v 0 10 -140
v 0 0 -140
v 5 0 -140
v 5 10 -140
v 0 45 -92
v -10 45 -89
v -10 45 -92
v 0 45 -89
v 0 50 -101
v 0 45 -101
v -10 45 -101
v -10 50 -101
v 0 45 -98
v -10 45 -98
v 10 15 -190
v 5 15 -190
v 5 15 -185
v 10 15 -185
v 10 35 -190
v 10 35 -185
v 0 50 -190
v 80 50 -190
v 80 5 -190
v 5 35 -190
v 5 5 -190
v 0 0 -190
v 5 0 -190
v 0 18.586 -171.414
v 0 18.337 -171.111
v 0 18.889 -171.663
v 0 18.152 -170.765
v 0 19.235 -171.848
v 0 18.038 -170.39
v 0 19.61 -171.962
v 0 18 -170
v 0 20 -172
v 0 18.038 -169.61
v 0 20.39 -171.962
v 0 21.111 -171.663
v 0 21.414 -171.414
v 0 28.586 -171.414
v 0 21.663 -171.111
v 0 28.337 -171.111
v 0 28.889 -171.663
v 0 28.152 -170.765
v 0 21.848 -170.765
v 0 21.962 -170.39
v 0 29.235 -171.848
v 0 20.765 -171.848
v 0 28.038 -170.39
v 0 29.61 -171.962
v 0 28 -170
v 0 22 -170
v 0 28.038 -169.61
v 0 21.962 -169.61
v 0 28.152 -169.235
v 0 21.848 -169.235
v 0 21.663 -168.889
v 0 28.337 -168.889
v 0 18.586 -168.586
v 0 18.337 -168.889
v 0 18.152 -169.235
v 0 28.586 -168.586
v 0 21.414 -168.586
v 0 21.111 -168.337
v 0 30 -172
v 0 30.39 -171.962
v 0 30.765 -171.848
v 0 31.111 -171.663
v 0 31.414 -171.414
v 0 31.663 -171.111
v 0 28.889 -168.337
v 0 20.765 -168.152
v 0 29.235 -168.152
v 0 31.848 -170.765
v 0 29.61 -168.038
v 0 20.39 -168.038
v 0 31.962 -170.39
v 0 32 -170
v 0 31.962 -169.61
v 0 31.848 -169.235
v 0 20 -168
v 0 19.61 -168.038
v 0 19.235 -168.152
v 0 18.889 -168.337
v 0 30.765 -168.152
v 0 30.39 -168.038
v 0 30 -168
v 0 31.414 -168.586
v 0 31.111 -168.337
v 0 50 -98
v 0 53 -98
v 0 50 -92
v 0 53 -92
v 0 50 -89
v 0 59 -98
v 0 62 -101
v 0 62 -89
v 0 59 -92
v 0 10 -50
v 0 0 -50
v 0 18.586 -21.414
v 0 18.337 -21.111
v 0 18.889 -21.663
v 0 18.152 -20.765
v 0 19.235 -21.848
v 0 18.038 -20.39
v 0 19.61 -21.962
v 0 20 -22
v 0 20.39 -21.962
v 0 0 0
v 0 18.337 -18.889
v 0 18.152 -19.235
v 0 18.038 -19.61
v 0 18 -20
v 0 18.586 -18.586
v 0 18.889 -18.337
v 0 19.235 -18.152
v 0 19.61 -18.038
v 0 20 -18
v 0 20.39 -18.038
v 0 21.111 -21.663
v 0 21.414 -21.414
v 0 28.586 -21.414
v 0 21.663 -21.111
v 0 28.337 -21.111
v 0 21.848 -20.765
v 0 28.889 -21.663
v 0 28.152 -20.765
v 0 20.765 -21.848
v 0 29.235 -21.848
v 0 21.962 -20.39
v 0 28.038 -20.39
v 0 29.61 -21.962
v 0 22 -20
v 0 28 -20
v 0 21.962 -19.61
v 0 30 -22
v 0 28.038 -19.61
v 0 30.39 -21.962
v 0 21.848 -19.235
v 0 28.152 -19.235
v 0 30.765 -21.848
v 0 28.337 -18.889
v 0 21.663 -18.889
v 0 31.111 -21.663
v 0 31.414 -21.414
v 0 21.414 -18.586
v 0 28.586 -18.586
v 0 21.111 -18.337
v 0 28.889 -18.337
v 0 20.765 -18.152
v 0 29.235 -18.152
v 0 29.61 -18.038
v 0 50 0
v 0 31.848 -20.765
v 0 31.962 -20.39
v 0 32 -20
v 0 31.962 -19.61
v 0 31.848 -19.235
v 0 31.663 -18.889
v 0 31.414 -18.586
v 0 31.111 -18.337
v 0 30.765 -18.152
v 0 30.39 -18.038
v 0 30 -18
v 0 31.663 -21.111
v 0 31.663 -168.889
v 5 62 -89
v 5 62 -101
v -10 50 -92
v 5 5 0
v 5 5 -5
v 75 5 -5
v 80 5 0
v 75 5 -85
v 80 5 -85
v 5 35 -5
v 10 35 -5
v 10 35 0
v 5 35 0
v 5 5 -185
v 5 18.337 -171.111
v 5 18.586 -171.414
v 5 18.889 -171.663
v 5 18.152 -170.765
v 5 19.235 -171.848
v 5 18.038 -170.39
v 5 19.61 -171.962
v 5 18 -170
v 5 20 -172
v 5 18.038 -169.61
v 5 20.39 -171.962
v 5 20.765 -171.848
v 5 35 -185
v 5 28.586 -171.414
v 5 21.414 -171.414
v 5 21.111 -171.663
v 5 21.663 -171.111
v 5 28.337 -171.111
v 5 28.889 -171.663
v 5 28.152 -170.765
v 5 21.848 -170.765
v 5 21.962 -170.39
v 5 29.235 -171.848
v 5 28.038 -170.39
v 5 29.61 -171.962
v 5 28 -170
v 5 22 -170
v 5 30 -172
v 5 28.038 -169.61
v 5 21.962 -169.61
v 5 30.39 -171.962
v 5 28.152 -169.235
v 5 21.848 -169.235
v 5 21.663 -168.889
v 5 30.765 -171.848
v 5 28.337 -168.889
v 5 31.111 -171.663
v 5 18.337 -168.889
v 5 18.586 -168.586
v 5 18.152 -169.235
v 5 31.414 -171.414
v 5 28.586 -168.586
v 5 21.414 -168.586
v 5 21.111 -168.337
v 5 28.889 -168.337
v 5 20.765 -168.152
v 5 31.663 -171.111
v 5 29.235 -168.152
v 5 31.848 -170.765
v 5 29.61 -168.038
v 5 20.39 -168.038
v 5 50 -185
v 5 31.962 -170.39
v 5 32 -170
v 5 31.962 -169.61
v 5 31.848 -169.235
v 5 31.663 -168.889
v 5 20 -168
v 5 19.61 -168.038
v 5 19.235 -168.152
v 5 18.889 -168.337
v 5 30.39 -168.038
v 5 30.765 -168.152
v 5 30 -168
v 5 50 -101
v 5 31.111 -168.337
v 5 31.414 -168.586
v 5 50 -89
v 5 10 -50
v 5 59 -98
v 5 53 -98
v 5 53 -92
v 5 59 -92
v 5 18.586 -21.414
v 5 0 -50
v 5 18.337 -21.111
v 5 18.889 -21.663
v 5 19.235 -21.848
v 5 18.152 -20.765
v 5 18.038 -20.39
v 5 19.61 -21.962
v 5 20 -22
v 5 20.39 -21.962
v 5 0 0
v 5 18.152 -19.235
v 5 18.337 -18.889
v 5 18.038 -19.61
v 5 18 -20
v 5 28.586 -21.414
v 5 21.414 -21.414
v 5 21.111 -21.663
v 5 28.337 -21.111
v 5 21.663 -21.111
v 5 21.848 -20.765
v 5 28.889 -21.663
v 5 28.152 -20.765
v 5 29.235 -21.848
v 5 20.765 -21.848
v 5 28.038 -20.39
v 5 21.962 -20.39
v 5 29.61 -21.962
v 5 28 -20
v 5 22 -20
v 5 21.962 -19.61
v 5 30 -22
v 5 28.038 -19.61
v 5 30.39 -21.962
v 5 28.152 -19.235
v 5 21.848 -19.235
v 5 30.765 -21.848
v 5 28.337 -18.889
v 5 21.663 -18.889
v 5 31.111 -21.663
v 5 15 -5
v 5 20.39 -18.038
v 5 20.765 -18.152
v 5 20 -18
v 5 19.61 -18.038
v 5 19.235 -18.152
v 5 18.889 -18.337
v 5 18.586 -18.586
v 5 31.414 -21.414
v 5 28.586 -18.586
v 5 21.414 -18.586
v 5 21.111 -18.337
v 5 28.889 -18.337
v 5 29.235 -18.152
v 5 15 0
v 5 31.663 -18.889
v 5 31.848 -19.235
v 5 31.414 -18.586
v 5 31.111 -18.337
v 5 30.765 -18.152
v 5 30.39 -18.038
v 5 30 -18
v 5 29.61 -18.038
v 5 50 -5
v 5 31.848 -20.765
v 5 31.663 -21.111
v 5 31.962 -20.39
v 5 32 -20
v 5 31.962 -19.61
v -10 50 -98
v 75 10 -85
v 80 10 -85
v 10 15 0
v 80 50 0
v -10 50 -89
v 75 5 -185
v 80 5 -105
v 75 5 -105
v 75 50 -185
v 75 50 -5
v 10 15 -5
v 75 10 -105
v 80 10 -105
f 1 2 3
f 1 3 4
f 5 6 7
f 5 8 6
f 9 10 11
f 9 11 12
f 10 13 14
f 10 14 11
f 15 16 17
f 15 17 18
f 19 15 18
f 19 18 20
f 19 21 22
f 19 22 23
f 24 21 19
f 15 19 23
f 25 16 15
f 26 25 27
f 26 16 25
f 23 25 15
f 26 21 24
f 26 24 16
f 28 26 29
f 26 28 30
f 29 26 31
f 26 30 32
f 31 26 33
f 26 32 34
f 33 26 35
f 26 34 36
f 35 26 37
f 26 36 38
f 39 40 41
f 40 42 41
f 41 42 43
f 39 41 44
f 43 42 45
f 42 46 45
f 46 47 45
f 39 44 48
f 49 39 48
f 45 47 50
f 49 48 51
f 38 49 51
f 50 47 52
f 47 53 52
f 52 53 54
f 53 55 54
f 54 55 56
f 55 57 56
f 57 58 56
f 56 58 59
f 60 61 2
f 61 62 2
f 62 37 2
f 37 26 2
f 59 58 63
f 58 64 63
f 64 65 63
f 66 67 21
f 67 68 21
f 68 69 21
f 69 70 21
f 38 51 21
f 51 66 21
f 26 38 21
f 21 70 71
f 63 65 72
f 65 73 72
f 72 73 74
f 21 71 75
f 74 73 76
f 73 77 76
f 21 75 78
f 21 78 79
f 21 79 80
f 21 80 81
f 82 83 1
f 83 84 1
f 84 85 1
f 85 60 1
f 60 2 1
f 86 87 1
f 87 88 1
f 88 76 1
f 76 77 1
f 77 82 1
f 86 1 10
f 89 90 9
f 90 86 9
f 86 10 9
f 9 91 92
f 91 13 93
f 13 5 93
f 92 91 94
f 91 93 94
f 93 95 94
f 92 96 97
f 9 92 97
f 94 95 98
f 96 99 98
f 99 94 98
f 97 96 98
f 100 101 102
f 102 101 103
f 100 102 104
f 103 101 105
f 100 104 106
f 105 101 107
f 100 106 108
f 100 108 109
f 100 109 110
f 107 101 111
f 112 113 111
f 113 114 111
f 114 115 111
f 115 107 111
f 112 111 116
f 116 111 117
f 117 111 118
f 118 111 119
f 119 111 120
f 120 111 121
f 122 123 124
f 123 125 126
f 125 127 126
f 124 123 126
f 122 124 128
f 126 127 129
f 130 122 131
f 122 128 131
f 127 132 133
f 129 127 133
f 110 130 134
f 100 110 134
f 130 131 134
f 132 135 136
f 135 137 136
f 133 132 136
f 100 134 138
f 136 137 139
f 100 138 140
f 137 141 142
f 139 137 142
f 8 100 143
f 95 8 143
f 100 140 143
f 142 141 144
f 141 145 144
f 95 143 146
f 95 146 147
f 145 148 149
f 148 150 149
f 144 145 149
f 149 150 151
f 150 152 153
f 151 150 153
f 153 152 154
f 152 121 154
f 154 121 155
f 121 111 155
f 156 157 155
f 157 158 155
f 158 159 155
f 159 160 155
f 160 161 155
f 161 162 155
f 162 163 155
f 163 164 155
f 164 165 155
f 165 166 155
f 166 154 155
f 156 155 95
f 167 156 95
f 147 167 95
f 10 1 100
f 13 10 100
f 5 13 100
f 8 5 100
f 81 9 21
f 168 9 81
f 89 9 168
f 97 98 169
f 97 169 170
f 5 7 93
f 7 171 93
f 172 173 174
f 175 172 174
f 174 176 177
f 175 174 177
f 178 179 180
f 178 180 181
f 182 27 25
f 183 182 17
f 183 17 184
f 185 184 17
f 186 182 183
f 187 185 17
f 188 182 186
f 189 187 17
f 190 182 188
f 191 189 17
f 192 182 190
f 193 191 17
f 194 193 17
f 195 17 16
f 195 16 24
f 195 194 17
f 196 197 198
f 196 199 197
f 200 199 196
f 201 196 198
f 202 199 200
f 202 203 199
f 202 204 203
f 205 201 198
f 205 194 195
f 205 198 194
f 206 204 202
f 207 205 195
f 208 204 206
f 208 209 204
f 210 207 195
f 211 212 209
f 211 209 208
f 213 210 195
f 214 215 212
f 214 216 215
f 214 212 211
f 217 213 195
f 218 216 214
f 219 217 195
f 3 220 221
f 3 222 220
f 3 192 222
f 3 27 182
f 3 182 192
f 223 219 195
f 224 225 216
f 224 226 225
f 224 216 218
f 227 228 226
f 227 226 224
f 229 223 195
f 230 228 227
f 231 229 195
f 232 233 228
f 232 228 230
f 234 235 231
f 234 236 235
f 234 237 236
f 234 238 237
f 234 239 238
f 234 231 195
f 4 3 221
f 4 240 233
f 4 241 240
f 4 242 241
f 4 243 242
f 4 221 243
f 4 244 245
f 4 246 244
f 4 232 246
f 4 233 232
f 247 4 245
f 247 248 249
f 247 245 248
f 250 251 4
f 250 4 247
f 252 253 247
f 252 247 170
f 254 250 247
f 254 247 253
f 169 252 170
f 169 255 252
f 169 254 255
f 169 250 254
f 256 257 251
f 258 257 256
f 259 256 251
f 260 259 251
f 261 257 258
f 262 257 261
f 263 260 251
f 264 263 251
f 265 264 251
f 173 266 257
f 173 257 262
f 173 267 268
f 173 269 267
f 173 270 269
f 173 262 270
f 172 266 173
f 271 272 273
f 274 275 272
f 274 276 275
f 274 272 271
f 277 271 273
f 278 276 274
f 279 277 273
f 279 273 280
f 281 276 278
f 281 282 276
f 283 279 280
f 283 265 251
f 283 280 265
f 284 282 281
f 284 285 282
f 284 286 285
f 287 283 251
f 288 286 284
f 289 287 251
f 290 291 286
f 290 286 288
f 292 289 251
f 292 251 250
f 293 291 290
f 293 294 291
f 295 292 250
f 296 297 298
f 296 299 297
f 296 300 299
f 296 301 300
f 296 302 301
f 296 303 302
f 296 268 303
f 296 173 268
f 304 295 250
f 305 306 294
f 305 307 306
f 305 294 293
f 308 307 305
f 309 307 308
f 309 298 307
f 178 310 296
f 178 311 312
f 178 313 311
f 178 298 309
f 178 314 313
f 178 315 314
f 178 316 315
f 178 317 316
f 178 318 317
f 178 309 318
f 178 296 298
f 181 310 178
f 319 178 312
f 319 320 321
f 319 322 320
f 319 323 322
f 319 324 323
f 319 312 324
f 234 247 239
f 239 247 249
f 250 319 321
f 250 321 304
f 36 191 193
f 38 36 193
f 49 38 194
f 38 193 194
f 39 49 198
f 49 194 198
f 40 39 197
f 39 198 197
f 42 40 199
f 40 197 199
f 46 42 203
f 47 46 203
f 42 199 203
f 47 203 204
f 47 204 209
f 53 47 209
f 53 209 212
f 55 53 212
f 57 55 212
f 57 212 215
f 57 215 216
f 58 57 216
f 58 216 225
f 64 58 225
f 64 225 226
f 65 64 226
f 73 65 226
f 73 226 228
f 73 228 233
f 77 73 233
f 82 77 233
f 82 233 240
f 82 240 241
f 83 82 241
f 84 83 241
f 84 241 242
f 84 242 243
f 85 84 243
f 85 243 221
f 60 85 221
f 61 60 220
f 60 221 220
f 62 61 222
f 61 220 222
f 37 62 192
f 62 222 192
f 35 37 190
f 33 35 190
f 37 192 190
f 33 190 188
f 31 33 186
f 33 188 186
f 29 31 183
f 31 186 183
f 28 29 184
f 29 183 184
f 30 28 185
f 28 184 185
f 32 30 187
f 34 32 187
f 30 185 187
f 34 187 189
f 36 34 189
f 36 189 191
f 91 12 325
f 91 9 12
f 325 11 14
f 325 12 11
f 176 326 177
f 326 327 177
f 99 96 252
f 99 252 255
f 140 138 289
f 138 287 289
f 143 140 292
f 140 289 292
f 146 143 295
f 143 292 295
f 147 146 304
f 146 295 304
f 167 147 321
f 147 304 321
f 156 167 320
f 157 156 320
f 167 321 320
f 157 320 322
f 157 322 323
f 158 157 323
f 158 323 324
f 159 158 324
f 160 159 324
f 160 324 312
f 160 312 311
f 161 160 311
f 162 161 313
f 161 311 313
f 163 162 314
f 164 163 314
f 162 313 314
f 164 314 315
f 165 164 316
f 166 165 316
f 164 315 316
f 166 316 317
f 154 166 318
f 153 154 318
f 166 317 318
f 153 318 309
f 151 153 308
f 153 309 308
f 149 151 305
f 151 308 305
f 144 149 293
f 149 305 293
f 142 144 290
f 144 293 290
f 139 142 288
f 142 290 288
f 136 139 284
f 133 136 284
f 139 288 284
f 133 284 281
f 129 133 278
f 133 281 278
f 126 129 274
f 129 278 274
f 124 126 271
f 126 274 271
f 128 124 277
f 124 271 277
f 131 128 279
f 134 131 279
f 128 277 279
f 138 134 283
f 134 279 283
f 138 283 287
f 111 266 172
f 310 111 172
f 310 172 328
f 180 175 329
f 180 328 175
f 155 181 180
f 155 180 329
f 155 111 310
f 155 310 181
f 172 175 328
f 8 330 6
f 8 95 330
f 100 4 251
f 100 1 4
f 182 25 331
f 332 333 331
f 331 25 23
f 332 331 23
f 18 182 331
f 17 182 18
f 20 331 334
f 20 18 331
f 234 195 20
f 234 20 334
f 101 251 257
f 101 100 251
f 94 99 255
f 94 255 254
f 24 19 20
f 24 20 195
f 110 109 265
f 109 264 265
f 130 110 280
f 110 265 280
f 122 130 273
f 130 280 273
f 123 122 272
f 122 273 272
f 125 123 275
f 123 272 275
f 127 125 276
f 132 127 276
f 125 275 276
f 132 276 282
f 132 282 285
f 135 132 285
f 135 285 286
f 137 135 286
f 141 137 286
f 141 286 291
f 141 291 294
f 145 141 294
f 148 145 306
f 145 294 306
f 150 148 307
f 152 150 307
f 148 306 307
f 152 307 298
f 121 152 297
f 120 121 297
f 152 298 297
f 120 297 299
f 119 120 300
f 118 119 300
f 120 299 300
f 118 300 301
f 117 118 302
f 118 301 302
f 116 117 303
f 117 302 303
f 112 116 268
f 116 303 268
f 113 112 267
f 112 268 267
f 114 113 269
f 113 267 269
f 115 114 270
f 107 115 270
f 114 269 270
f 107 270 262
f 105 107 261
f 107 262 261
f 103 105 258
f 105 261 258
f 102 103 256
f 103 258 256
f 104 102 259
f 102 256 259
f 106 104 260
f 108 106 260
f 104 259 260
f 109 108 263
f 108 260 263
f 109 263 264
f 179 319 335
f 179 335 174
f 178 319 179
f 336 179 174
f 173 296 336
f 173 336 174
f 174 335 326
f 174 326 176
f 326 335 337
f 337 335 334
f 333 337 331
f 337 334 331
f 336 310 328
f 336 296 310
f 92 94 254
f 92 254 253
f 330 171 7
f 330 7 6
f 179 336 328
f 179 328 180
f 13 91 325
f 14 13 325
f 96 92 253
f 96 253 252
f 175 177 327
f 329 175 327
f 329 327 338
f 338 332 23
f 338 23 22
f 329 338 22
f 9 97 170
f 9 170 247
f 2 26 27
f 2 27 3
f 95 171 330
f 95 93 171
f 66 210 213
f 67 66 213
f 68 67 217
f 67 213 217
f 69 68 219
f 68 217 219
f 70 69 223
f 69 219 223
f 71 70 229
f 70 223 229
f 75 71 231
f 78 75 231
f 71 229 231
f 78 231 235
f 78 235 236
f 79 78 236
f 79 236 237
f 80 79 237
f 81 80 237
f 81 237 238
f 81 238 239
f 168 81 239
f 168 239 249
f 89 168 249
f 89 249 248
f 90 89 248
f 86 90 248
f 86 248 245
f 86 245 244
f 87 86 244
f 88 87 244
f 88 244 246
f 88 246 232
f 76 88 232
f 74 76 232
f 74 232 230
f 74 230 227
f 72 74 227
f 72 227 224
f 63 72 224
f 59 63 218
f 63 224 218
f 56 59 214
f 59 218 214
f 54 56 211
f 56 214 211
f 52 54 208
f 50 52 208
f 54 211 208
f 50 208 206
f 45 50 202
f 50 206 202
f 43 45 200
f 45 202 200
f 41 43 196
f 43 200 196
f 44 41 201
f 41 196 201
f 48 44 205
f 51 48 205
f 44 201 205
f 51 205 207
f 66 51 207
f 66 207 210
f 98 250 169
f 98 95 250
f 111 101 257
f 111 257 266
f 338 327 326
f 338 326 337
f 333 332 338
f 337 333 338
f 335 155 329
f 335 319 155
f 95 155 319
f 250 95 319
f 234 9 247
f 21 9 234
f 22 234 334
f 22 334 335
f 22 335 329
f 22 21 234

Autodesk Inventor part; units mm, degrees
ref_plane "YZ Plane" through (0, 0, 0) normal (1, 0, 0) x (0, 1, 0)
ref_plane "XZ Plane" through (0, 0, 0) normal (0, 1, 0) x (-1, 0, 0)
ref_plane "XY Plane" through (0, 0, 0) normal (0, 0, 1) x (1, 0, 0)
sketch "Sketch1" plane through (0, 0, 0) normal (1, 0, 0) x (0, 1, 0)
  line L0 (0, 0) -> (50, 0)
  line L1 (50, 0) -> (50, -50)
  line L2 (0, 0) -> (10, 0)
  line L3 (10, -50) -> (0, -50)
  line L4 (0, -50) -> (0, 0)
  line L5 (50, -50) -> (50, -190)
  line L6 (50, -190) -> (0, -190)
  line L7 (0, -190) -> (0, -140)
  line L8 (0, -140) -> (10, -140)
  line L9 (10, -140) -> (10, -50)
  line L10 (0, -105) -> (50, -105) construction
  line L11 (50, -89) -> (62, -89)
  line L12 (62, -89) -> (62, -101)
  line L13 (62, -101) -> (50, -101)
  line L14 (50, -101) -> (50, -89)
  line L15 (59, -92) -> (53, -92)
  line L16 (53, -92) -> (53, -98)
  line L17 (53, -98) -> (59, -98)
  line L18 (59, -98) -> (59, -92)
  point P0 (50, -101)
  dimension "d0" = 50
  dimension "d4" = 50
  dimension "d5" = 10
  dimension "d8" = 190
  dimension "d9" = 50
  dimension "d10" = 12
  dimension "d11" = 12
  dimension "d12" = 3
  dimension "d19" = 89
extrude "Extrusion1" add sketch "Sketch1" along normal blind 5
sketch "Sketch2" plane through (0, 0, 0) normal (-1, 0, 0) x (0, 0, 1)
  line L0 (-190, 50) -> (-101, 50) projected
  line L1 (-101, 50) -> (-89, 50)
  line L2 (-89, 50) -> (-89, 45)
  line L3 (-89, 45) -> (-101, 45)
  line L4 (-101, 45) -> (-101, 50)
  point P0 (0, 0)
  dimension "d13" = 5
extrude "Extrusion2" add sketch "Sketch2" along normal blind 10
sketch "Sketch3" plane through (0, 50, -89) normal (0, 1, 0) x (1, 0, 0)
  line L0 (-10, 12) -> (-10, 0) projected
  line L1 (0, 0) -> (0, 12) projected
  line L2 (-10, 3) -> (0, 3)
  line L3 (0, 3) -> (0, 9)
  line L4 (0, 9) -> (-10, 9)
  line L5 (-10, 9) -> (-10, 3)
  point P0 (0, -89)
  point P1 (-10, 9)
  point P2 (0, 3)
  dimension "d16" = 6
extrude "Extrusion3" cut sketch "Sketch3" against normal blind 10
sketch "Sketch4" plane through (5, 0, 0) normal (1, 0, 0) x (0, 0, -1)
  line L0 (89, 50) -> (0, 50) projected
  line L1 (0, 0) -> (50, 0) projected
  line L2 (190, 50) -> (101, 50) projected
  line L3 (0, 50) -> (5, 50)
  line L4 (5, 50) -> (5, 5)
  line L5 (5, 5) -> (0, 5)
  line L6 (0, 5) -> (0, 50)
  line L7 (190, 0) -> (190, 50) projected
  line L8 (185, 50) -> (190, 50)
  line L9 (190, 50) -> (190, 5)
  line L10 (190, 5) -> (185, 5)
  line L11 (185, 5) -> (185, 50)
  point P0 (5, 0)
  dimension "d27" = 5
  dimension "d28" = 45
  dimension "d32" = 45
extrude "Extrusion4" add sketch "Sketch4" along normal blind 75
sketch "Sketch6" plane through (0, 0, 0) normal (0, 0, 1) x (1, 0, 0)
  point P0 (0, 0)
sketch "Sketch7" plane through (5, 5, -185) normal (0, 0, 1) x (1, 0, 0)
  line L0 (0, 45) -> (75, 45) projected
  line L1 (0, 0) -> (75, 0) projected
  line L2 (75, 45) -> (70, 45)
  line L3 (70, 45) -> (70, 0)
  line L4 (70, 0) -> (75, 0)
  line L5 (75, 0) -> (75, 45)
  point P0 (-5, -5)
  dimension "d29" = 5
extrude "Extrusion6" add sketch "Sketch7" along normal blind 180
sketch "Sketch8" plane through (80, 0, 0) normal (1, 0, 0) x (0, 0, -1)
  line L0 (50, 10) -> (140, 10) projected
  line L1 (85, 5) -> (105, 5)
  line L2 (105, 5) -> (105, 10)
  line L3 (105, 10) -> (85, 10)
  line L4 (85, 10) -> (85, 5)
  point P0 (0, 0)
  dimension "d33" = 20
extrude "Extrusion7" cut sketch "Sketch8" against normal blind 180
sketch "Sketch9" plane through (5, 0, 0) normal (1, 0, 0) x (0, 0, -1)
  circle A0 centre (20, 30) radius 2
  circle A1 centre (20, 20) radius 2
  circle A2 centre (170, 30) radius 2
  circle A3 centre (170, 20) radius 2
  line L0 (0, 50) -> (0, 5) projected
  line L1 (190, 5) -> (190, 50) projected
  line L2 (89, 50) -> (5, 50) projected
  line L3 (185, 50) -> (101, 50) projected
  point P0 (0, 0)
  dimension "d36" = 4
  dimension "d37" = 4
  dimension "d38" = 4
  dimension "d39" = 4
  dimension "d40" = 20
  dimension "d41" = 20
  dimension "d42" = 20
  dimension "d43" = 20
  dimension "d44" = 10
  dimension "d45" = 10
  dimension "d46" = 20
  dimension "d47" = 20
extrude "Extrusion8" cut sketch "Sketch9" against normal blind 180
sketch "Sketch10" plane through (0, 0, -190) normal (0, 0, -1) x (-1, 0, 0)
  line L0 (-5, 50) -> (-5, 5) projected
  line L1 (-5, 15) -> (-10, 15)
  line L2 (-10, 15) -> (-10, 35)
  line L3 (-10, 35) -> (-5, 35)
  line L4 (-5, 35) -> (-5, 15)
  point P0 (0, 0)
  dimension "d50" = 5
  dimension "d51" = 20
extrude "Extrusion9" cut sketch "Sketch10" against normal through all
properties part number "cover"
